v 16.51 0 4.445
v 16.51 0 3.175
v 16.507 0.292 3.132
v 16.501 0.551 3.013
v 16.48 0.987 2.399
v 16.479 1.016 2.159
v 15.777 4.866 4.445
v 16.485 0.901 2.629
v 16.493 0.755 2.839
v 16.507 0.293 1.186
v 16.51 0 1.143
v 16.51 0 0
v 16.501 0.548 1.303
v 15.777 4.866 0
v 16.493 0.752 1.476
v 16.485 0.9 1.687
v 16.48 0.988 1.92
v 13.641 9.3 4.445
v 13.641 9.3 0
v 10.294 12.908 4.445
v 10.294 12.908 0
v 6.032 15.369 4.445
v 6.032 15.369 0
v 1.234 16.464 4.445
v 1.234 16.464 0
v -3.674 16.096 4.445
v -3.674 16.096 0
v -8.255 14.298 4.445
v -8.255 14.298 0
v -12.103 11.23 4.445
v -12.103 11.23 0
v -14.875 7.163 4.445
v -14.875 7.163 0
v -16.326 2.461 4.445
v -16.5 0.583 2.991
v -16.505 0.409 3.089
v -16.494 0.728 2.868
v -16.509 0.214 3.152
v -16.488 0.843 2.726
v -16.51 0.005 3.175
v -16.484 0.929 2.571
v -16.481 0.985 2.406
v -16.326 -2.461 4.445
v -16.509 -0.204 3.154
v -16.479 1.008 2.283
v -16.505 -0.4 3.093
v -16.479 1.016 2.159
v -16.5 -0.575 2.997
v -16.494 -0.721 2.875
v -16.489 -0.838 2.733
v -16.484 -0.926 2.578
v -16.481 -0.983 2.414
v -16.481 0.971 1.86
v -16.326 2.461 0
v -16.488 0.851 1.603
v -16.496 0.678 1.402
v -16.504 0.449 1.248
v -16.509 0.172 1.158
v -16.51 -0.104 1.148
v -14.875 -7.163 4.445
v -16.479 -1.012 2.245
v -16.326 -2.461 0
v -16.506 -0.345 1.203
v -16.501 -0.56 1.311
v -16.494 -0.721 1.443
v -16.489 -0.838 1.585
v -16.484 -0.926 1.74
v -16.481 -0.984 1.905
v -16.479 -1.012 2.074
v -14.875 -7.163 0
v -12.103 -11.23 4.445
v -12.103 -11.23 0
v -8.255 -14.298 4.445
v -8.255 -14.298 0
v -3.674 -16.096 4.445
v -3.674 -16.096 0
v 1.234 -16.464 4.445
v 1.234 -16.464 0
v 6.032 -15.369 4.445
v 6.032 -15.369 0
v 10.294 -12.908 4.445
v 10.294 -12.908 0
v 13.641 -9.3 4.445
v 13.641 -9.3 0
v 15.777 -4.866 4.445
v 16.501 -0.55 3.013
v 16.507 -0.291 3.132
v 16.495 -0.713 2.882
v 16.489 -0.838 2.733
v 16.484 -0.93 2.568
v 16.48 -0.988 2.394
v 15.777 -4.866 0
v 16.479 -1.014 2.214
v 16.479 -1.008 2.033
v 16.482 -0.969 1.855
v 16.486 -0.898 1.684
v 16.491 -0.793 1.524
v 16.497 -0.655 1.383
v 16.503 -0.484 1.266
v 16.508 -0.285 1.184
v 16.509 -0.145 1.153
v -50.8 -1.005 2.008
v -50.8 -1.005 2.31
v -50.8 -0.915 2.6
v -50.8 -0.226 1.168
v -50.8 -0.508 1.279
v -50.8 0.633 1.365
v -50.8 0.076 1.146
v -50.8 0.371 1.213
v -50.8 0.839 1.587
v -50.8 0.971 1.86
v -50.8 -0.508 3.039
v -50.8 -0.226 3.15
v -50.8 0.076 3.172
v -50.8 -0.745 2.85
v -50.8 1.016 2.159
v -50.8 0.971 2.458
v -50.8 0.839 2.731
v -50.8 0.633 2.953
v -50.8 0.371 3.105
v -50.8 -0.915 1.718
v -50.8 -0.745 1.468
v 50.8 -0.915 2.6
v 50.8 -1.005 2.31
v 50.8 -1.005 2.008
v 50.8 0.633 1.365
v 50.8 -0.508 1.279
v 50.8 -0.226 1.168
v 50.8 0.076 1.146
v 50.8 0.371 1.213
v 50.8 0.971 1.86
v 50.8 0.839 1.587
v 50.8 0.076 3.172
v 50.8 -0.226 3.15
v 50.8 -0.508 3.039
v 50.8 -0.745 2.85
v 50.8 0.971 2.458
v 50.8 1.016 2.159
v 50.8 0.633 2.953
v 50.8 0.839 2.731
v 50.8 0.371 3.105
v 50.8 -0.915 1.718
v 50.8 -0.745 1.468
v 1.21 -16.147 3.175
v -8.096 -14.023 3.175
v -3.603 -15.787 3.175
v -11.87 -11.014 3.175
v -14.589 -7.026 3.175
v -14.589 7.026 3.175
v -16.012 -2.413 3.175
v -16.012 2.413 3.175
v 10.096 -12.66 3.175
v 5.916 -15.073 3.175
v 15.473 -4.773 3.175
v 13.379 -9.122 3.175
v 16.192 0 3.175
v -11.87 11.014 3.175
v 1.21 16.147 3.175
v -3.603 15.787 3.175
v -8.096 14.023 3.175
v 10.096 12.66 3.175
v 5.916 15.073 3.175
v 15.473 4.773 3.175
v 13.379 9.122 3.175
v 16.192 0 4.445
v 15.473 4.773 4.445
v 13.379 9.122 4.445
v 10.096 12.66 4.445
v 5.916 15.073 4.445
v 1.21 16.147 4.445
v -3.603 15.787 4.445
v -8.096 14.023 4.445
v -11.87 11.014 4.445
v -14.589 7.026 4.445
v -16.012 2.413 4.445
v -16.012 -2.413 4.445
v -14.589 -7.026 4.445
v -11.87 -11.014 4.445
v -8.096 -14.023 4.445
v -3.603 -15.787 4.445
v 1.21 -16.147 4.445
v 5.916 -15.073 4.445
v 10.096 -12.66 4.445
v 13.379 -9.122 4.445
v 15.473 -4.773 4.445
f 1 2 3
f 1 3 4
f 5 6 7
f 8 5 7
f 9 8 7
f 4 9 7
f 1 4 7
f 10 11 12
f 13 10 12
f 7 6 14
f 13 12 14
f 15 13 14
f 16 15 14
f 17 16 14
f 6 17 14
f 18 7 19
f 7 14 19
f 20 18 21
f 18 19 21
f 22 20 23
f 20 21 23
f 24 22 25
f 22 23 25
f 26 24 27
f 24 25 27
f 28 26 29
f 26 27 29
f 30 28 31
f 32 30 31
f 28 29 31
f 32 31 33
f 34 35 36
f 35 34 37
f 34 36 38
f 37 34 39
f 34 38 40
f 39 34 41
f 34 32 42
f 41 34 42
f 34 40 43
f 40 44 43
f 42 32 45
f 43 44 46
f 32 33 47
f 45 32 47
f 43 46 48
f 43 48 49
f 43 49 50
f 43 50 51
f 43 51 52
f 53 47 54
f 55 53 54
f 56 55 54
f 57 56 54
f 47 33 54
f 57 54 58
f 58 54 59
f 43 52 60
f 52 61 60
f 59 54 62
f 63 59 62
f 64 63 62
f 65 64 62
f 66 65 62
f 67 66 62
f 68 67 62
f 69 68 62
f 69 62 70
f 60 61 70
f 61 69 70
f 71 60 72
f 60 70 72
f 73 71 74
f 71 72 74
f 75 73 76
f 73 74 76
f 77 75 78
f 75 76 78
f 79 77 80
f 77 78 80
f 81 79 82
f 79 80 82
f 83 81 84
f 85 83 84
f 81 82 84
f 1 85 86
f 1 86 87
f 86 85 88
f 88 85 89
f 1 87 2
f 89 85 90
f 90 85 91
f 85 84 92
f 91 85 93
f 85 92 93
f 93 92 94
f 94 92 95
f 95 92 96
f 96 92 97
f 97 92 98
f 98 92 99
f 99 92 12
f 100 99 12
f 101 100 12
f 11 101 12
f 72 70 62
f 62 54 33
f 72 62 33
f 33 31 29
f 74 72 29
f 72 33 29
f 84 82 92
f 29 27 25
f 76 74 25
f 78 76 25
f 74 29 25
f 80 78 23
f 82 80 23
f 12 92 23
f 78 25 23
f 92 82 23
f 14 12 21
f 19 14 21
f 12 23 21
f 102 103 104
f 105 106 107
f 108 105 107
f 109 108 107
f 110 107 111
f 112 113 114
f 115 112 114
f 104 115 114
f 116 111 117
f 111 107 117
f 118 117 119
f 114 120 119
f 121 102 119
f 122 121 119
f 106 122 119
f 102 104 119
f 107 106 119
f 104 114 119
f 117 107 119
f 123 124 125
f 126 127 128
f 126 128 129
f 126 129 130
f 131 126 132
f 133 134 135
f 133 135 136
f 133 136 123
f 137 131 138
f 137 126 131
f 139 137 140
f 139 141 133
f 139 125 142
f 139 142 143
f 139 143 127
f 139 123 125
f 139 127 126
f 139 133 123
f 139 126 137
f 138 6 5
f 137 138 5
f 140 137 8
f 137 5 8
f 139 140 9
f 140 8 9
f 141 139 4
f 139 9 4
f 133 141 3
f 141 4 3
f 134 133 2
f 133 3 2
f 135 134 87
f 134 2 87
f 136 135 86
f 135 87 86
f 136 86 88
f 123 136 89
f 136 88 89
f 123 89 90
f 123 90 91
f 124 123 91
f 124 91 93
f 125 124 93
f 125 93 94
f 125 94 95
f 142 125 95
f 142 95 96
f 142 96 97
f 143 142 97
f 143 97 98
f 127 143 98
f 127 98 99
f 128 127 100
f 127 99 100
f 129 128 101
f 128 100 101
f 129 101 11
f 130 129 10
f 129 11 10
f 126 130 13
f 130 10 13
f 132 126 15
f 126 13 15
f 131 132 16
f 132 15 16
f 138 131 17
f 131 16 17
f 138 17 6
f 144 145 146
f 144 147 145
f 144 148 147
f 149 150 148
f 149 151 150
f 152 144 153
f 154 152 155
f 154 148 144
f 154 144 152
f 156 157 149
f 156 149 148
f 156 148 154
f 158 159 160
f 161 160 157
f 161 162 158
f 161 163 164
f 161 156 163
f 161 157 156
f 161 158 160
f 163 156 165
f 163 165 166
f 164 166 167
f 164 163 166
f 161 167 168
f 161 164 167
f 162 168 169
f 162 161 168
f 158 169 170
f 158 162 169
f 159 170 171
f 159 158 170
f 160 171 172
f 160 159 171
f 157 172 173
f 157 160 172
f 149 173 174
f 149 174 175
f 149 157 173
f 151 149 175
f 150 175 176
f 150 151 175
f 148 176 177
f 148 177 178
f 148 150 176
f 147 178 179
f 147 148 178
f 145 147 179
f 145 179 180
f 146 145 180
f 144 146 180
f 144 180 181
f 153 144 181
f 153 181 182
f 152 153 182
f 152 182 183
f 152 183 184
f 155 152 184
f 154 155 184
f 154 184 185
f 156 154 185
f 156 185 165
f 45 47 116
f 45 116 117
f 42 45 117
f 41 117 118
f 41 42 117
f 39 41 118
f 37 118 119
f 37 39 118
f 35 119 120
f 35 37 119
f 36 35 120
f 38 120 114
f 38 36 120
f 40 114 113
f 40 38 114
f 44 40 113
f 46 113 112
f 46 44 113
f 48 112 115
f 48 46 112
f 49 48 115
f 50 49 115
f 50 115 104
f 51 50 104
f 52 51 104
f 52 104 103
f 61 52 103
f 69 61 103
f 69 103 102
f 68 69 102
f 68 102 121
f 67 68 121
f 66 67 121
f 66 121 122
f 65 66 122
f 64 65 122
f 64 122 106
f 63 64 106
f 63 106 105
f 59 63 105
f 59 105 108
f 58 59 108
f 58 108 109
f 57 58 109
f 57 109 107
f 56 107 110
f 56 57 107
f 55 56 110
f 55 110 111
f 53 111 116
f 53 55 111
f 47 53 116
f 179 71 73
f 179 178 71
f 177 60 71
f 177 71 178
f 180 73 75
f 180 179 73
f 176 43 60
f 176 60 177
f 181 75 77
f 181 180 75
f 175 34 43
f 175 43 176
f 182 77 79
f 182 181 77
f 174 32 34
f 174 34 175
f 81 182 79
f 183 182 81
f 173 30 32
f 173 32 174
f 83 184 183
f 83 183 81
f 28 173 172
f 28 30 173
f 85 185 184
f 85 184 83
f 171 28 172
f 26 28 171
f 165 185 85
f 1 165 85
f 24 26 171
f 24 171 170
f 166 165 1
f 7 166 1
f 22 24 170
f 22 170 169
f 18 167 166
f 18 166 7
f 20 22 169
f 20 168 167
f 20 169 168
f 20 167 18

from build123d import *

# Parameters (mm, degrees)
F0_R          = 16.51
F1_DEPTH      = 3.175
F2_R          = 16.51
F2_R_2        = 16.1925
F3_DEPTH      = 1.27
F4_R          = 1.016
F5_DEPTH      = 50.8
F5_DEPTH_BACK = 50.8


with BuildPart() as f1:
    # F0 (on Top) → F1 (new body)
    with BuildSketch(Plane.XY):
        Circle(F0_R)
    extrude(amount=F1_DEPTH)

    # F2 (on face) → F3 (join)
    with BuildSketch(Plane.XY.offset(3.175)):
        Circle(F2_R)
        Circle(F2_R_2, mode=Mode.SUBTRACT)
    extrude(amount=F3_DEPTH)

    # F4 (on Right) → F5 (join, two sides)
    with BuildSketch(Plane.YZ) as f5_sk:
        with Locations((0, 2.159)):
            Circle(F4_R)
    extrude(amount=F5_DEPTH)
    extrude(f5_sk.sketch, amount=-F5_DEPTH_BACK)


solid = f1.part
